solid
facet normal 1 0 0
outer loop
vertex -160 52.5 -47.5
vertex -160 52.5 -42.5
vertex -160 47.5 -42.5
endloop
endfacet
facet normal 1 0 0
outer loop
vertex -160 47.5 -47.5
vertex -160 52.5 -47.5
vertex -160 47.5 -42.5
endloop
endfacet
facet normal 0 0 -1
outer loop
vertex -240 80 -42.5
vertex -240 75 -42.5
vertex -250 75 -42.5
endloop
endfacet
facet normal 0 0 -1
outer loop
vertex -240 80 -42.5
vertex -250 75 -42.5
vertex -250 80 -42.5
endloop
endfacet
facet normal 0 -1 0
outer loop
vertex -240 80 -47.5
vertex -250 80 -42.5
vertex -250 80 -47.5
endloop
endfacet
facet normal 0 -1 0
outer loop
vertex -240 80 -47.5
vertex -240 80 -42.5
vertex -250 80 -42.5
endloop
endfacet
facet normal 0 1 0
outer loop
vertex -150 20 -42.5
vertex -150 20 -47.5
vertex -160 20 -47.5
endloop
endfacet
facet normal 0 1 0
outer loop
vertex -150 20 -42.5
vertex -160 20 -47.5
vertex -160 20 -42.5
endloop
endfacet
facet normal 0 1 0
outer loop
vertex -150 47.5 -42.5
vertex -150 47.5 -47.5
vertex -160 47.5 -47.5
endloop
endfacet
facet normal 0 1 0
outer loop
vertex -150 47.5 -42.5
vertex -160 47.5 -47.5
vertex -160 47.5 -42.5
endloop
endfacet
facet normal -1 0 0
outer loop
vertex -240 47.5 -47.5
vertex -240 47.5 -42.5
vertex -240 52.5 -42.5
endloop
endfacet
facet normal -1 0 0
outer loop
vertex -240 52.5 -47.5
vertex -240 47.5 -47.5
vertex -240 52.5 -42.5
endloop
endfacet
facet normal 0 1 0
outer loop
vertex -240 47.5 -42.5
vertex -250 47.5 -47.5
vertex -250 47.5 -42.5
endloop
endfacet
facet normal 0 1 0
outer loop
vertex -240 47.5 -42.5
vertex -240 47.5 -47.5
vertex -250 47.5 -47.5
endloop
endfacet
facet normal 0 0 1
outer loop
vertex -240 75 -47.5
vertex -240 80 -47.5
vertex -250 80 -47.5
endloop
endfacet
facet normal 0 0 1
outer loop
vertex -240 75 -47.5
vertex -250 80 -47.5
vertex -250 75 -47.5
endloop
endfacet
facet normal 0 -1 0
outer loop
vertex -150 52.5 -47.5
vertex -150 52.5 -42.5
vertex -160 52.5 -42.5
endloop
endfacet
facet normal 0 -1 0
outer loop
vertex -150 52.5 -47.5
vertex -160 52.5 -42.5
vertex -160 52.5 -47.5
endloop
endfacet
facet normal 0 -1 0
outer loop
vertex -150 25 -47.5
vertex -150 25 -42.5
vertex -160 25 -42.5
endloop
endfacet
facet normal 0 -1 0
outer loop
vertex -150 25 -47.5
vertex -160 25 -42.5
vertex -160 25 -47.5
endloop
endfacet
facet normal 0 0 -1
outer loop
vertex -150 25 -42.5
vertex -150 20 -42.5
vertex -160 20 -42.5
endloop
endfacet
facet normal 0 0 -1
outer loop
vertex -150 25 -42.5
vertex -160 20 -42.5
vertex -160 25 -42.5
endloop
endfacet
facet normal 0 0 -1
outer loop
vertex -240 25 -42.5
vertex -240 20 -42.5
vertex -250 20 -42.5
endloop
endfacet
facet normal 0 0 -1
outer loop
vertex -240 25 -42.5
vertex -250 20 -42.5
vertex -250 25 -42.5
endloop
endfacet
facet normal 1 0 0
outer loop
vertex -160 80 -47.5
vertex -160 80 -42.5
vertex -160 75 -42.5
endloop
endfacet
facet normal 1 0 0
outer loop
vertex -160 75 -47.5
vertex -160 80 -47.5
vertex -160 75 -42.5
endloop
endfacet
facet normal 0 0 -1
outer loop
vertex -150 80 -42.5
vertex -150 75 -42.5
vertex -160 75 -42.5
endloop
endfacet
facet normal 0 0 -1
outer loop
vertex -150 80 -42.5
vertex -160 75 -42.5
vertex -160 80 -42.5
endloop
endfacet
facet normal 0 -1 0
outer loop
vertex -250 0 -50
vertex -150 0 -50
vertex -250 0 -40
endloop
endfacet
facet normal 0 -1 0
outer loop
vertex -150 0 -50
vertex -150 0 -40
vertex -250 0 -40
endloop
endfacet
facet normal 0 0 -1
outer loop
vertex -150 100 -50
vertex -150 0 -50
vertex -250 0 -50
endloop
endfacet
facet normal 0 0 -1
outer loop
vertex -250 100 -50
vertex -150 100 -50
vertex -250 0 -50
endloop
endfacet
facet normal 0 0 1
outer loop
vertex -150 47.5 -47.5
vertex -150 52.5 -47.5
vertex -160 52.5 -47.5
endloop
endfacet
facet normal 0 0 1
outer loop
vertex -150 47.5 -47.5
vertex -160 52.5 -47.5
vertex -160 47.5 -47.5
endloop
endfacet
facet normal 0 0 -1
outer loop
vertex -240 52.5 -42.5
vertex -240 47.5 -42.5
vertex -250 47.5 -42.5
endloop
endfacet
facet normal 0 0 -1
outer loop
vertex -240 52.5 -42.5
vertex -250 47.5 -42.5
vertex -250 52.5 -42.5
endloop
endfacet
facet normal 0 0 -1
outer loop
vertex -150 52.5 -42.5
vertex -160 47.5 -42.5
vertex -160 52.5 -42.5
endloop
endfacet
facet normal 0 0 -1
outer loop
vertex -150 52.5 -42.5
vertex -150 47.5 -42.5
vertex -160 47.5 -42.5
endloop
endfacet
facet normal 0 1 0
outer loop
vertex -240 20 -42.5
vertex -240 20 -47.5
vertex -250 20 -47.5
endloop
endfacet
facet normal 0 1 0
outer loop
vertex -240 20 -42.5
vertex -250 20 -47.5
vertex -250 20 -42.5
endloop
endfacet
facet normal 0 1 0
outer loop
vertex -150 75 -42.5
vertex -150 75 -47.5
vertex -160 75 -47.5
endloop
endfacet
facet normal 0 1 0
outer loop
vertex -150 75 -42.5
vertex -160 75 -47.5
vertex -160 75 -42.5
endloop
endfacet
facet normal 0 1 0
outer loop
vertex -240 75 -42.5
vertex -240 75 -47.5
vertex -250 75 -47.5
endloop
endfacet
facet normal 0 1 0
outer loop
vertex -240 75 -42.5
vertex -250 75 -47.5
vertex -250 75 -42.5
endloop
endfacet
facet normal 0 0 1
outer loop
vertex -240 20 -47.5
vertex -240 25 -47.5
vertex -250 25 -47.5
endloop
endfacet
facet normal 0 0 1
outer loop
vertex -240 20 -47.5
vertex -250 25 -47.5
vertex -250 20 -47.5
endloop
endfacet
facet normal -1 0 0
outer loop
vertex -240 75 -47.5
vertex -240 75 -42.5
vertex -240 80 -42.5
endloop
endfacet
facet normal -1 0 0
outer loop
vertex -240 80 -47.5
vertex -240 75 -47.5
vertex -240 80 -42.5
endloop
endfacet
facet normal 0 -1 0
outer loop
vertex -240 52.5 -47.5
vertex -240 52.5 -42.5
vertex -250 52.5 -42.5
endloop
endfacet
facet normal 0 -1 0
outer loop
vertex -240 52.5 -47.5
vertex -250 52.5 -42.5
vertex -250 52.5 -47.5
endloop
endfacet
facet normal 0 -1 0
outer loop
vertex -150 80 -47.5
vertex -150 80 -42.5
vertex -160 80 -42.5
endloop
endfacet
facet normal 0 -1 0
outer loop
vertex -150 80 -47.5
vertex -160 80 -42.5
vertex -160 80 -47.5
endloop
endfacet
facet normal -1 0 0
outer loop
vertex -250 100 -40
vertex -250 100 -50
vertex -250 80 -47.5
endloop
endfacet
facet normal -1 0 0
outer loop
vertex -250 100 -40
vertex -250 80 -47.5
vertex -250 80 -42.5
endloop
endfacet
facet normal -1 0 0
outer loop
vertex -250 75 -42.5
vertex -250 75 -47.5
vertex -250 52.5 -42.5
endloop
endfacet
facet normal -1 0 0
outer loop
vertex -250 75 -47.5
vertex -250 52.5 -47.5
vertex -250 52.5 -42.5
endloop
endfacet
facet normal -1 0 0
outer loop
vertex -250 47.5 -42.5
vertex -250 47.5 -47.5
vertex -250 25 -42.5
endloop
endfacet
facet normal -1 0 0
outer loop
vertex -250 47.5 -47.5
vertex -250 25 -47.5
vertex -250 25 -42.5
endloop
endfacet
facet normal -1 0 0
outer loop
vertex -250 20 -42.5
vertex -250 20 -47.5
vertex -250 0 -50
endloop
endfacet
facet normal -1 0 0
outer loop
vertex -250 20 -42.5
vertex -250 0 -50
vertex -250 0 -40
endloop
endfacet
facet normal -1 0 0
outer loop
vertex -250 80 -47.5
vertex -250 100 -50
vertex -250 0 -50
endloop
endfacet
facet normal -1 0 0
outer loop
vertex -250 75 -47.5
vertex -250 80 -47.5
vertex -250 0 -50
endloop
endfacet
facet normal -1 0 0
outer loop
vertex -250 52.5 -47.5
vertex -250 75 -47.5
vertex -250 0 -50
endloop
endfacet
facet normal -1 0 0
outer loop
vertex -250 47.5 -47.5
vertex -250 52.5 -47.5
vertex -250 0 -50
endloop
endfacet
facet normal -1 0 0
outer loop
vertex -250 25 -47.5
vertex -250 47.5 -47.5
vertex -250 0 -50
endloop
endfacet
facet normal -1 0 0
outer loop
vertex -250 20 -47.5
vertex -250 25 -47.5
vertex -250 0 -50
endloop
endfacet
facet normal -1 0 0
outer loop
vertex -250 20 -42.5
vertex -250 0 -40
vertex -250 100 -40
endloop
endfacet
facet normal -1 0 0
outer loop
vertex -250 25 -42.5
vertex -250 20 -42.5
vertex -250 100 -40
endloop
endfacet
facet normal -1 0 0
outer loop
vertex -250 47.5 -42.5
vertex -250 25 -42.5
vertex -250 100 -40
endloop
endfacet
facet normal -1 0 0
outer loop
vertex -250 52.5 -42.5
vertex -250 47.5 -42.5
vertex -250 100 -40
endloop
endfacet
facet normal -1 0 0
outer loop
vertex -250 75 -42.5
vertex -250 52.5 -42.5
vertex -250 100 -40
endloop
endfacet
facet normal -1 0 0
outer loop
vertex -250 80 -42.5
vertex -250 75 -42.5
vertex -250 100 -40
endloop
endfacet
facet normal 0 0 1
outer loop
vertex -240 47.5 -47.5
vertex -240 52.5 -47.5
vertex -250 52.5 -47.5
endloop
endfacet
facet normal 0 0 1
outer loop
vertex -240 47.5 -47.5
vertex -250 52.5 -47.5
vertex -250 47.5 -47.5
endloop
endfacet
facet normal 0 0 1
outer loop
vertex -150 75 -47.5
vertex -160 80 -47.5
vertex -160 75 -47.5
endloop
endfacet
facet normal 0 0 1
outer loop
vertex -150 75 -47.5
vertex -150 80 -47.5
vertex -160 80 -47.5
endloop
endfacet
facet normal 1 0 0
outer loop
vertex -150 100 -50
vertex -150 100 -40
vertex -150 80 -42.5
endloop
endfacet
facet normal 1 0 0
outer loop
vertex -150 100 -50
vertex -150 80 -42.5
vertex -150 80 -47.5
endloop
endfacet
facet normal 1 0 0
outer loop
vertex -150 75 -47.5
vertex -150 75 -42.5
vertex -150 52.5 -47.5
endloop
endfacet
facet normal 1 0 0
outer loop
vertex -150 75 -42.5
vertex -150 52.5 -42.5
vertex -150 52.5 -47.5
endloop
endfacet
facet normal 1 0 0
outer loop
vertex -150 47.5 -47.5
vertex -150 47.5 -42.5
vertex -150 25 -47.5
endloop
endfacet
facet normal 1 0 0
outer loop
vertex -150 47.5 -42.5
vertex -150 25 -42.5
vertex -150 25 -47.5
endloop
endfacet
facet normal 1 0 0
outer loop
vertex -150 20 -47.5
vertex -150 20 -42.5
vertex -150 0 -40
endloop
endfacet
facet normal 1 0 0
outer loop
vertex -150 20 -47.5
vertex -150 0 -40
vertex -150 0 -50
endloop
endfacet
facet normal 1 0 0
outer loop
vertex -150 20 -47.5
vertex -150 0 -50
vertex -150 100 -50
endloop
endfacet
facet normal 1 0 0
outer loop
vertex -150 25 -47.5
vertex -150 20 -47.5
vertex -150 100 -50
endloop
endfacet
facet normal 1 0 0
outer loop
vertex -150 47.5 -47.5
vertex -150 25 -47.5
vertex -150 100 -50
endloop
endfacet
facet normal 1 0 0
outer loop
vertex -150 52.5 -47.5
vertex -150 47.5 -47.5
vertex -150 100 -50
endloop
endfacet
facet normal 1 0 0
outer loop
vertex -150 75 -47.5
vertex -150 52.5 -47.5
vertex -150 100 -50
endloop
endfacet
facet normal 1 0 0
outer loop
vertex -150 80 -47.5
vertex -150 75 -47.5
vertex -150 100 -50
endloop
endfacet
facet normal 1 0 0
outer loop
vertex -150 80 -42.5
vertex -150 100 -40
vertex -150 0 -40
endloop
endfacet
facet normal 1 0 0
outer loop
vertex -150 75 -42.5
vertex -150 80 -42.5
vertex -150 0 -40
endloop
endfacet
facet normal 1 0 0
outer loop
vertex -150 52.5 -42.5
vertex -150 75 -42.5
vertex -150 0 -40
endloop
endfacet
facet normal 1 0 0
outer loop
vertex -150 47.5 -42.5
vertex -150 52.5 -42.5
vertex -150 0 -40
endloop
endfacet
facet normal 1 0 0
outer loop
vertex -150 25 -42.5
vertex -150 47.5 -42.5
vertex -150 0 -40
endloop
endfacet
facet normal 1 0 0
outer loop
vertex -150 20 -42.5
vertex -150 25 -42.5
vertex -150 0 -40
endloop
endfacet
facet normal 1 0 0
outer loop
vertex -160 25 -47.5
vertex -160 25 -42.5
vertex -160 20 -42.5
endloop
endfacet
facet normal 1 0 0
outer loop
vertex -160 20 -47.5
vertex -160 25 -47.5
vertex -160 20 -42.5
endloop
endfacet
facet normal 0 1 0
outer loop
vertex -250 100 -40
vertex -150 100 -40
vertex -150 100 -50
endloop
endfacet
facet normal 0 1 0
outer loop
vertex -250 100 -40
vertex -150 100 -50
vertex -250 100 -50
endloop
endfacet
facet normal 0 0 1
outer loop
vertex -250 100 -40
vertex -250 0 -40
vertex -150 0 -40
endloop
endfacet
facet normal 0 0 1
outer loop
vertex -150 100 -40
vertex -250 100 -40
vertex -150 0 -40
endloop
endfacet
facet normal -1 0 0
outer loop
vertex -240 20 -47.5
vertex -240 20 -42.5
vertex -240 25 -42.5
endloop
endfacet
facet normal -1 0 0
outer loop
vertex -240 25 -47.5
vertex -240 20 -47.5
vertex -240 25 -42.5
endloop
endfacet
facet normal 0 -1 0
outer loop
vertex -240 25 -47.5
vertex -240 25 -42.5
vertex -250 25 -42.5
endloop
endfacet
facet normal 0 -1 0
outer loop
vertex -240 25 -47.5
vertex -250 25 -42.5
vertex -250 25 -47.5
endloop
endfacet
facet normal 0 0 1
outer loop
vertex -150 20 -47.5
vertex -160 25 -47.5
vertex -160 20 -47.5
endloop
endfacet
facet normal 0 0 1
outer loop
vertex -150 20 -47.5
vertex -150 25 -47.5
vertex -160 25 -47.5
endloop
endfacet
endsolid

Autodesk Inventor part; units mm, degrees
ref_plane "YZ Plane" through (0, 0, 0) normal (1, 0, 0) x (0, 1, 0)
ref_plane "XZ Plane" through (0, 0, 0) normal (0, 1, 0) x (-1, 0, 0)
ref_plane "XY Plane" through (0, 0, 0) normal (0, 0, 1) x (1, 0, 0)
sketch "Sketch1" plane through (0, 0, 0) normal (0, 1, 0) x (-1, 0, 0)
  line L0 (400, -50) -> (400, 50)
  line L1 (400, 50) -> (390, 50)
  line L2 (390, 50) -> (390, -40)
  line L3 (390, -40) -> (300, -40)
  line L4 (300, -40) -> (300, -50)
  line L5 (300, -50) -> (400, -50)
  line L6 (250, -50) -> (250, -40)
  line L7 (250, -40) -> (150, -40)
  line L8 (150, -40) -> (150, -50)
  line L9 (150, -50) -> (250, -50)
  line L10 (100, -50) -> (100, -40)
  line L11 (100, -40) -> (10, -40)
  line L12 (10, -40) -> (10, 50)
  line L13 (10, 50) -> (0, 50)
  line L14 (0, 50) -> (0, -50)
  line L15 (0, -50) -> (100, -50)
  point P0 (0, 0)
  dimension "d0" = 100
  dimension "d1" = 100
  dimension "d2" = 10
  dimension "d3" = 10
  dimension "d4" = 100
  dimension "d5" = 100
  dimension "d6" = 100
  dimension "d7" = 10
  dimension "d8" = 10
  dimension "d9" = 50
  dimension "d10" = 50
  dimension "d11" = 400
  dimension "d12" = 50
  dimension "d13" = 50
extrude "Extrusion1" add sketch "Sketch1" along normal blind 100
sketch "Sketch2" plane through (0, 0, 0) normal (1, 0, 0) x (0, 1, 0)
  point P0 (0, 0)
sketch "Sketch3" plane through (0, 0, 50) normal (1, 0, 0) x (0, 0, -1)
  line L0 (92.5, 80) -> (97.5, 80)
  line L1 (97.5, 80) -> (97.5, 75)
  line L2 (97.5, 75) -> (92.5, 75)
  line L3 (92.5, 75) -> (92.5, 80)
  line L4 (97.5, 20) -> (92.5, 20)
  line L5 (92.5, 20) -> (92.5, 25)
  line L6 (92.5, 25) -> (97.5, 25)
  line L7 (97.5, 25) -> (97.5, 20)
  line L8 (0, 100) -> (100, 100) projected
  line L9 (100, 0) -> (100, 100) projected
  line L10 (0, 0) -> (100, 0) projected
  line L11 (92.5, 52.5) -> (97.5, 52.5)
  line L12 (97.5, 52.5) -> (97.5, 47.5)
  line L13 (97.5, 47.5) -> (92.5, 47.5)
  line L14 (92.5, 47.5) -> (92.5, 52.5)
  point P0 (50, 0)
  dimension "d16" = 20
  dimension "d17" = 5
  dimension "d18" = 5
  dimension "d19" = 2.5
  dimension "d20" = 20
  dimension "d21" = 5
  dimension "d22" = 5
  dimension "d24" = 7.5
  dimension "d25" = 5
  dimension "d26" = 5
  dimension "d27" = 2.5
  dimension "d28" = 22.5
extrude "Extrusion2" cut sketch "Sketch3" against normal blind 320
sketch "Sketch4" plane through (0, 0, 50) normal (1, 0, 0) x (0, 0, -1)
  line L0 (97.5, 75) -> (92.5, 75) projected
  line L1 (97.5, 80) -> (97.5, 75) projected
  line L2 (92.5, 80) -> (97.5, 80) projected
  line L3 (92.5, 75) -> (92.5, 80) projected
  line L4 (97.5, 47.5) -> (92.5, 47.5) projected
  line L5 (97.5, 52.5) -> (97.5, 47.5) projected
  line L6 (92.5, 52.5) -> (97.5, 52.5) projected
  line L7 (92.5, 47.5) -> (92.5, 52.5) projected
  line L8 (92.5, 25) -> (97.5, 25) projected
  line L9 (92.5, 20) -> (92.5, 25) projected
  line L10 (97.5, 20) -> (92.5, 20) projected
  line L11 (97.5, 25) -> (97.5, 20) projected
  line L12 (92.5, 80) -> (97.5, 80)
  line L13 (97.5, 80) -> (97.5, 75)
  line L14 (97.5, 75) -> (92.5, 75)
  line L15 (92.5, 75) -> (92.5, 80)
  line L16 (92.5, 52.5) -> (97.5, 52.5)
  line L17 (97.5, 52.5) -> (97.5, 47.5)
  line L18 (97.5, 47.5) -> (92.5, 47.5)
  line L19 (92.5, 47.5) -> (92.5, 52.5)
  line L20 (92.5, 25) -> (97.5, 25)
  line L21 (97.5, 25) -> (97.5, 20)
  line L22 (97.5, 20) -> (92.5, 20)
  line L23 (92.5, 20) -> (92.5, 25)
  point P0 (50, 0)
extrude "Extrusion3" add sketch "Sketch4" against normal blind 80
sketch "Sketch6" plane through (-250, 0, -40) normal (0, 0, 1) x (1, 0, 0)
  line L0 (-50, 80) -> (-50, 75) projected
  line L1 (-50, 80) -> (-70, 80) projected
  line L2 (-70, 80) -> (-70, 75) projected
  line L3 (-50, 75) -> (-70, 75) projected
  line L4 (-50, 52.5) -> (-50, 47.5) projected
  line L5 (-50, 52.5) -> (-70, 52.5) projected
  line L6 (-70, 52.5) -> (-70, 47.5) projected
  line L7 (-50, 47.5) -> (-70, 47.5) projected
  line L8 (-50, 25) -> (-50, 20) projected
  line L9 (-50, 25) -> (-70, 25) projected
  line L10 (-70, 25) -> (-70, 20) projected
  line L11 (-50, 20) -> (-70, 20) projected
  line L12 (0, 75) -> (0, 80) projected
  line L13 (100, 75) -> (0, 75) projected
  line L14 (100, 80) -> (100, 75) projected
  line L15 (100, 80) -> (0, 80) projected
  line L16 (0, 47.5) -> (0, 52.5) projected
  line L17 (100, 47.5) -> (0, 47.5) projected
  line L18 (100, 52.5) -> (100, 47.5) projected
  line L19 (100, 52.5) -> (0, 52.5) projected
  line L20 (0, 20) -> (0, 25) projected
  line L21 (100, 20) -> (0, 20) projected
  line L22 (100, 25) -> (100, 20) projected
  line L23 (100, 25) -> (0, 25) projected
  line L24 (170, 75) -> (170, 80) projected
  line L25 (170, 80) -> (150, 80) projected
  line L26 (150, 75) -> (150, 80) projected
  line L27 (170, 75) -> (150, 75) projected
  line L28 (170, 47.5) -> (170, 52.5) projected
  line L29 (170, 52.5) -> (150, 52.5) projected
  line L30 (150, 47.5) -> (150, 52.5) projected
  line L31 (170, 47.5) -> (150, 47.5) projected
  line L32 (170, 20) -> (170, 25) projected
  line L33 (170, 25) -> (150, 25) projected
  line L34 (150, 20) -> (150, 25) projected
  line L35 (170, 20) -> (150, 20) projected
  line L36 (-70, 80) -> (-60, 80)
  line L37 (-60, 80) -> (-60, 20)
  line L38 (-60, 20) -> (-70, 20)
  line L39 (-70, 20) -> (-70, 80)
  line L40 (10, 80) -> (90, 80)
  line L41 (90, 80) -> (90, 20)
  line L42 (90, 20) -> (10, 20)
  line L43 (10, 20) -> (10, 80)
  line L44 (160, 80) -> (170, 80)
  line L45 (170, 80) -> (170, 20)
  line L46 (170, 20) -> (160, 20)
  line L47 (160, 20) -> (160, 80)
  line L48 (0, 0) -> (0, 100) projected
  line L49 (100, 0) -> (100, 100) projected
  line L50 (10, 25) -> (90, 25)
  line L51 (90, 25) -> (90, 20)
  line L52 (90, 20) -> (10, 20)
  line L53 (10, 20) -> (10, 25)
  point P0 (250, 0)
  point P1 (160, 25)
  point P2 (160, 20)
  point P3 (160, 52.5)
  point P4 (160, 47.5)
  point P5 (160, 75)
  point P6 (10, 75)
  point P7 (90, 75)
  point P8 (90, 80)
  point P9 (10, 52.5)
  point P10 (10, 47.5)
  point P11 (90, 47.5)
  point P12 (90, 52.5)
  point P13 (10, 25)
  point P14 (10, 20)
  point P15 (-60, 25)
  point P16 (-60, 47.5)
  point P17 (-60, 52.5)
  point P18 (-60, 75)
  point P19 (90, 25)
  point P20 (90, 25)
  dimension "d33" = 10
  dimension "d34" = 10
extrude "Extrusion4" add sketch "Sketch6" against normal blind 10 contours L37 L3 L2 L1 | L37 L5 L39 L3 | L37 L7 L6 L5 | L37 L9 L39 L7 | L37 L11 L10 L9 | L43 L15 L41 L13 | L19 L41 L17 L43 | L23 L41 L21 L43 | L27 L47 L25 L24 | L45 L29 L47 L27 | L28 L31 L47 L29 | L45 L33 L47 L31 | L32 L35 L47 L33
sketch "Sketch8" plane through (0, 100, 0) normal (0, 1, 0) x (1, 0, 0)
  line L0 (-300, 50) -> (-400, 50) projected
  line L1 (-400, 50) -> (-400, -50) projected
  line L2 (0, 50) -> (-100, 50) projected
  line L3 (0, -50) -> (0, 50) projected
  line L4 (-400, 50) -> (-300, 50)
  line L5 (-300, 50) -> (-300, -50)
  line L6 (-300, -50) -> (-400, -50)
  line L7 (-400, -50) -> (-400, 50)
  line L8 (0, 50) -> (-100, 50)
  line L9 (-100, 50) -> (-100, -50)
  line L10 (-100, -50) -> (0, -50)
  line L11 (0, -50) -> (0, 50)
  point P0 (0, 0)
  dimension "d44" = 100
  dimension "d45" = 100
  dimension "d46" = 100
extrude "Extrusion6" cut sketch "Sketch8" against normal through all
properties part number "Soccer Goal Split"
